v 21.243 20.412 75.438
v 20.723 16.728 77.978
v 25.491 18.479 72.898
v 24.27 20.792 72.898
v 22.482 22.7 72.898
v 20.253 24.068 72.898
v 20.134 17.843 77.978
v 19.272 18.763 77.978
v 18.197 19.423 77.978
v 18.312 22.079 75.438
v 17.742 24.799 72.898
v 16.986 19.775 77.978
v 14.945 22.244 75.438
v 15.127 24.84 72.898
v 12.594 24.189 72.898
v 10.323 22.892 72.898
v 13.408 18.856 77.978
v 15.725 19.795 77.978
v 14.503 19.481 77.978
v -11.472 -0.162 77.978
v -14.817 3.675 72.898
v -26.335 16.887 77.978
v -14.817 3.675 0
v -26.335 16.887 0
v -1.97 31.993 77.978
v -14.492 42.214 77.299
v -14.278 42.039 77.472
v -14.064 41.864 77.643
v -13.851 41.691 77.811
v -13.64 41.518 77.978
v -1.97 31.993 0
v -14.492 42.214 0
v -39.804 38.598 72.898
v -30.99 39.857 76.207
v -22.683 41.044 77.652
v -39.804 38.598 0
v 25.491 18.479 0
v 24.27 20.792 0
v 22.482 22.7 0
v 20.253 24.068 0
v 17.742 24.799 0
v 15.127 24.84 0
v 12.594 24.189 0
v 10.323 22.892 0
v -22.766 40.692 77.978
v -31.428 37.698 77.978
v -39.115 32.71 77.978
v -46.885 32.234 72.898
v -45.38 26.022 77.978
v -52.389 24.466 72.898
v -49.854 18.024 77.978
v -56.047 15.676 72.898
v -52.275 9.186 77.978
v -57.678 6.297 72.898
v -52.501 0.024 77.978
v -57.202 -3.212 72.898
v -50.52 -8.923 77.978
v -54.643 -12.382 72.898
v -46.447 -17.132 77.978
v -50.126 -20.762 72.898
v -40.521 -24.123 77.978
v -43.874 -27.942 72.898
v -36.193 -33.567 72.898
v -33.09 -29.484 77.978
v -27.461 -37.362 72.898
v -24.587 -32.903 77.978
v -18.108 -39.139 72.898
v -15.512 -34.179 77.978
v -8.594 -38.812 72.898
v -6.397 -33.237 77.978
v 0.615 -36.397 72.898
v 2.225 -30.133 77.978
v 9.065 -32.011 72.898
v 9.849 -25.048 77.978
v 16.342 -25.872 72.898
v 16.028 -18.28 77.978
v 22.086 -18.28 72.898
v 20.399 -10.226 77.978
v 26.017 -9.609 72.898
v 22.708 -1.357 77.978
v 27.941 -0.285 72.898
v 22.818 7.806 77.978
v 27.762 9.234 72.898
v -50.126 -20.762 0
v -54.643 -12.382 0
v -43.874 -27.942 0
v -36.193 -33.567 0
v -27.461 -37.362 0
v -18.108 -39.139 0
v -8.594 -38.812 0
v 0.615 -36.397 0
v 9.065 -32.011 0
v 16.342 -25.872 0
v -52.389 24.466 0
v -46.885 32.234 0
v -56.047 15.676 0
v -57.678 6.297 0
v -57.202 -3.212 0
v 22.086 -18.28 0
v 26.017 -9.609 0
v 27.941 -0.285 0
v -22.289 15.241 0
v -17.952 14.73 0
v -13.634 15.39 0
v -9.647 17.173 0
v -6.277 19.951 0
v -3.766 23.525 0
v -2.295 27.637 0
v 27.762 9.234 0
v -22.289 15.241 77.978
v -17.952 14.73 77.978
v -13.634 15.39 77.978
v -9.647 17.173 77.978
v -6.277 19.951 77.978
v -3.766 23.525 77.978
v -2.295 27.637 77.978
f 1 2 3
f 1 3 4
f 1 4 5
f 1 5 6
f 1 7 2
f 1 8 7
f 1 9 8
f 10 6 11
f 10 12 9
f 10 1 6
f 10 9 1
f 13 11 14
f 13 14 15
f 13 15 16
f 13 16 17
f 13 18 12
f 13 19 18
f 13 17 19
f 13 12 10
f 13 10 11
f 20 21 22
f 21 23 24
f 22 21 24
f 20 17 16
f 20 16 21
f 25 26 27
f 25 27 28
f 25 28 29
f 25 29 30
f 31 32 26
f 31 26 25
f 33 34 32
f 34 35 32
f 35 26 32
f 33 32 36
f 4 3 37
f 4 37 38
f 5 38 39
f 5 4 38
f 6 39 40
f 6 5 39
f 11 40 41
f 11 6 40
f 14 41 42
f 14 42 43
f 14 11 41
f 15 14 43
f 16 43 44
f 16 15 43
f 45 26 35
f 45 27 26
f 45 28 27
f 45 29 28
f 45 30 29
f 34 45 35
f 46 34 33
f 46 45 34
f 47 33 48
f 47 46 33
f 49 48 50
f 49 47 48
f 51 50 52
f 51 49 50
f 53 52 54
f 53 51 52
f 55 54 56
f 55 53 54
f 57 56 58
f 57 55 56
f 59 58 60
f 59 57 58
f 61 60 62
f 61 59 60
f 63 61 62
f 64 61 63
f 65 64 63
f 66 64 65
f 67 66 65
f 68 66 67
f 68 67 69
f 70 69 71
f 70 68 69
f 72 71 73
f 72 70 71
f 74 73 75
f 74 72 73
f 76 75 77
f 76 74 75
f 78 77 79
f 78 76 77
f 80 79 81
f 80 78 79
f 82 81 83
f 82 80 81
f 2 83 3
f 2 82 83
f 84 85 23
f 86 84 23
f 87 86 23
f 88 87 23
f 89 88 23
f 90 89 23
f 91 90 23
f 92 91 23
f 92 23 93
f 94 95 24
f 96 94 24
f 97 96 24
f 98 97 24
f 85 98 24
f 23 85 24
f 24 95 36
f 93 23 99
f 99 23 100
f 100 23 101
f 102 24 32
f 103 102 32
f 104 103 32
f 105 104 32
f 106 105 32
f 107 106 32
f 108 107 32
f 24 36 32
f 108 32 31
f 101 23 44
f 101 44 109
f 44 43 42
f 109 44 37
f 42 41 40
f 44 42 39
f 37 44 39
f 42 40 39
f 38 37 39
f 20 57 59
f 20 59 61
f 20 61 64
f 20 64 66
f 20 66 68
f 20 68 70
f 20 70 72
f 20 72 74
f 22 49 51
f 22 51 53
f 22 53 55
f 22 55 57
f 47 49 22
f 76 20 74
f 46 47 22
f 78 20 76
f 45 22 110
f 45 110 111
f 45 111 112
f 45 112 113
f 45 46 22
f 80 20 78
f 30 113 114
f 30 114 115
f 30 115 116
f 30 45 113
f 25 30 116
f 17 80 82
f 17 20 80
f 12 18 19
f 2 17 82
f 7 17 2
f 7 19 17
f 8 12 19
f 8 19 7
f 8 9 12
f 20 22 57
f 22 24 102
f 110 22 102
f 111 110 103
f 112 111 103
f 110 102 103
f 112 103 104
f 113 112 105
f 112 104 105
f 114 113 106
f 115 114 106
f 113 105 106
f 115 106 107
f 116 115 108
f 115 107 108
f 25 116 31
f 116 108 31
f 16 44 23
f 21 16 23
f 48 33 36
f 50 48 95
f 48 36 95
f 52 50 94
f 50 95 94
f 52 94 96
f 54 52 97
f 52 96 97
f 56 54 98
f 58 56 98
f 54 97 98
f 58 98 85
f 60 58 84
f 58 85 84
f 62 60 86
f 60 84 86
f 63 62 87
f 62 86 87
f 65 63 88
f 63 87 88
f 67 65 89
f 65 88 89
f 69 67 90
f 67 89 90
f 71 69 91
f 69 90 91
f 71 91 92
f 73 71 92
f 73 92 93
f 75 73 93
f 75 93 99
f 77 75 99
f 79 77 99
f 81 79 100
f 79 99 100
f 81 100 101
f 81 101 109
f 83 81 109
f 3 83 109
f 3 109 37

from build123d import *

# Parameters (mm, degrees)
F1_DEPTH    = 77.978
F2_R        = 9.8113639175
F3_T1_DEPTH = 141.3502926448
F4_SIZE     = 5.08


# Not quite as in the source:
# - a fillet or chamfer that OpenCascade refuses, or shapes differently, is made with other operations: its cross-section is extruded or revolved along the edge and cut away or added


with BuildPart() as f1:
    # F0 (on Top) → F1 (new body)
    with BuildSketch(Plane.XY):
        with BuildLine():
            Line((-7.4381157756, 43.2214848697), (-39.8039706051, 38.5977886617))
            ThreePointArc((-39.8039706051, 38.5977886617), (-21.172854192, -38.7924441896), (19.2988961935, 29.7524612397))
            Line((19.2988961935, 29.7524612397), (-14.8171193926, 3.6754181444))
            Line((-14.8171193926, 3.6754181444), (-26.3349507004, 16.8865323067))
            ThreePointArc((-26.3349507004, 16.8865323067), (-4.9953492686, 21.5214038686), (-7.4381157756, 43.2214848697))
        make_face()
    extrude(amount=F1_DEPTH)

    # F2
    f2_edges = [f1.edges().sort_by_distance(p)[0] for p in [
        (19.298896, 29.752461, 38.989),
    ]]
    fillet(f2_edges, radius=F2_R)

    # F3: chamfer of 5.08 on 1 edges, made by hand

    # F3_s2 → F3_t1 (cut)
    with BuildSketch(Plane.XY.offset(-31.6861463224)):
        with BuildLine():
            Line((-14.6495810062, 42.3422516773), (-1.8120830861, 31.8641235926))
            Line((-1.8120830861, 31.8641235926), (-1.7106647042, 31.8701958104))
            ThreePointArc((-1.7106647042, 31.8701958104), (-3.4500397911, 38.1062153929), (-7.3708029252, 43.2975870391))
            Line((-7.3708029252, 43.2975870391), (-7.4524841935, 43.3220637371))
            ThreePointArc((-7.4524841935, 43.3220637371), (-11.0476484326, 42.8084685502), (-14.663949424, 42.4428305447))
            Line((-14.663949424, 42.4428305447), (-14.6495810062, 42.3422516773))
        make_face()
    extrude(amount=F3_T1_DEPTH, mode=Mode.SUBTRACT)

    # F4
    f4_edges = [f1.edges().sort_by_distance(p)[0] for p in [
        (-27.46138, -37.361606, 77.978),
        (19.021994, 24.517514, 77.978),
        (-2.246992, 13.283567, 77.978),
    ]]
    chamfer(f4_edges, length=F4_SIZE)


solid = f1.part
